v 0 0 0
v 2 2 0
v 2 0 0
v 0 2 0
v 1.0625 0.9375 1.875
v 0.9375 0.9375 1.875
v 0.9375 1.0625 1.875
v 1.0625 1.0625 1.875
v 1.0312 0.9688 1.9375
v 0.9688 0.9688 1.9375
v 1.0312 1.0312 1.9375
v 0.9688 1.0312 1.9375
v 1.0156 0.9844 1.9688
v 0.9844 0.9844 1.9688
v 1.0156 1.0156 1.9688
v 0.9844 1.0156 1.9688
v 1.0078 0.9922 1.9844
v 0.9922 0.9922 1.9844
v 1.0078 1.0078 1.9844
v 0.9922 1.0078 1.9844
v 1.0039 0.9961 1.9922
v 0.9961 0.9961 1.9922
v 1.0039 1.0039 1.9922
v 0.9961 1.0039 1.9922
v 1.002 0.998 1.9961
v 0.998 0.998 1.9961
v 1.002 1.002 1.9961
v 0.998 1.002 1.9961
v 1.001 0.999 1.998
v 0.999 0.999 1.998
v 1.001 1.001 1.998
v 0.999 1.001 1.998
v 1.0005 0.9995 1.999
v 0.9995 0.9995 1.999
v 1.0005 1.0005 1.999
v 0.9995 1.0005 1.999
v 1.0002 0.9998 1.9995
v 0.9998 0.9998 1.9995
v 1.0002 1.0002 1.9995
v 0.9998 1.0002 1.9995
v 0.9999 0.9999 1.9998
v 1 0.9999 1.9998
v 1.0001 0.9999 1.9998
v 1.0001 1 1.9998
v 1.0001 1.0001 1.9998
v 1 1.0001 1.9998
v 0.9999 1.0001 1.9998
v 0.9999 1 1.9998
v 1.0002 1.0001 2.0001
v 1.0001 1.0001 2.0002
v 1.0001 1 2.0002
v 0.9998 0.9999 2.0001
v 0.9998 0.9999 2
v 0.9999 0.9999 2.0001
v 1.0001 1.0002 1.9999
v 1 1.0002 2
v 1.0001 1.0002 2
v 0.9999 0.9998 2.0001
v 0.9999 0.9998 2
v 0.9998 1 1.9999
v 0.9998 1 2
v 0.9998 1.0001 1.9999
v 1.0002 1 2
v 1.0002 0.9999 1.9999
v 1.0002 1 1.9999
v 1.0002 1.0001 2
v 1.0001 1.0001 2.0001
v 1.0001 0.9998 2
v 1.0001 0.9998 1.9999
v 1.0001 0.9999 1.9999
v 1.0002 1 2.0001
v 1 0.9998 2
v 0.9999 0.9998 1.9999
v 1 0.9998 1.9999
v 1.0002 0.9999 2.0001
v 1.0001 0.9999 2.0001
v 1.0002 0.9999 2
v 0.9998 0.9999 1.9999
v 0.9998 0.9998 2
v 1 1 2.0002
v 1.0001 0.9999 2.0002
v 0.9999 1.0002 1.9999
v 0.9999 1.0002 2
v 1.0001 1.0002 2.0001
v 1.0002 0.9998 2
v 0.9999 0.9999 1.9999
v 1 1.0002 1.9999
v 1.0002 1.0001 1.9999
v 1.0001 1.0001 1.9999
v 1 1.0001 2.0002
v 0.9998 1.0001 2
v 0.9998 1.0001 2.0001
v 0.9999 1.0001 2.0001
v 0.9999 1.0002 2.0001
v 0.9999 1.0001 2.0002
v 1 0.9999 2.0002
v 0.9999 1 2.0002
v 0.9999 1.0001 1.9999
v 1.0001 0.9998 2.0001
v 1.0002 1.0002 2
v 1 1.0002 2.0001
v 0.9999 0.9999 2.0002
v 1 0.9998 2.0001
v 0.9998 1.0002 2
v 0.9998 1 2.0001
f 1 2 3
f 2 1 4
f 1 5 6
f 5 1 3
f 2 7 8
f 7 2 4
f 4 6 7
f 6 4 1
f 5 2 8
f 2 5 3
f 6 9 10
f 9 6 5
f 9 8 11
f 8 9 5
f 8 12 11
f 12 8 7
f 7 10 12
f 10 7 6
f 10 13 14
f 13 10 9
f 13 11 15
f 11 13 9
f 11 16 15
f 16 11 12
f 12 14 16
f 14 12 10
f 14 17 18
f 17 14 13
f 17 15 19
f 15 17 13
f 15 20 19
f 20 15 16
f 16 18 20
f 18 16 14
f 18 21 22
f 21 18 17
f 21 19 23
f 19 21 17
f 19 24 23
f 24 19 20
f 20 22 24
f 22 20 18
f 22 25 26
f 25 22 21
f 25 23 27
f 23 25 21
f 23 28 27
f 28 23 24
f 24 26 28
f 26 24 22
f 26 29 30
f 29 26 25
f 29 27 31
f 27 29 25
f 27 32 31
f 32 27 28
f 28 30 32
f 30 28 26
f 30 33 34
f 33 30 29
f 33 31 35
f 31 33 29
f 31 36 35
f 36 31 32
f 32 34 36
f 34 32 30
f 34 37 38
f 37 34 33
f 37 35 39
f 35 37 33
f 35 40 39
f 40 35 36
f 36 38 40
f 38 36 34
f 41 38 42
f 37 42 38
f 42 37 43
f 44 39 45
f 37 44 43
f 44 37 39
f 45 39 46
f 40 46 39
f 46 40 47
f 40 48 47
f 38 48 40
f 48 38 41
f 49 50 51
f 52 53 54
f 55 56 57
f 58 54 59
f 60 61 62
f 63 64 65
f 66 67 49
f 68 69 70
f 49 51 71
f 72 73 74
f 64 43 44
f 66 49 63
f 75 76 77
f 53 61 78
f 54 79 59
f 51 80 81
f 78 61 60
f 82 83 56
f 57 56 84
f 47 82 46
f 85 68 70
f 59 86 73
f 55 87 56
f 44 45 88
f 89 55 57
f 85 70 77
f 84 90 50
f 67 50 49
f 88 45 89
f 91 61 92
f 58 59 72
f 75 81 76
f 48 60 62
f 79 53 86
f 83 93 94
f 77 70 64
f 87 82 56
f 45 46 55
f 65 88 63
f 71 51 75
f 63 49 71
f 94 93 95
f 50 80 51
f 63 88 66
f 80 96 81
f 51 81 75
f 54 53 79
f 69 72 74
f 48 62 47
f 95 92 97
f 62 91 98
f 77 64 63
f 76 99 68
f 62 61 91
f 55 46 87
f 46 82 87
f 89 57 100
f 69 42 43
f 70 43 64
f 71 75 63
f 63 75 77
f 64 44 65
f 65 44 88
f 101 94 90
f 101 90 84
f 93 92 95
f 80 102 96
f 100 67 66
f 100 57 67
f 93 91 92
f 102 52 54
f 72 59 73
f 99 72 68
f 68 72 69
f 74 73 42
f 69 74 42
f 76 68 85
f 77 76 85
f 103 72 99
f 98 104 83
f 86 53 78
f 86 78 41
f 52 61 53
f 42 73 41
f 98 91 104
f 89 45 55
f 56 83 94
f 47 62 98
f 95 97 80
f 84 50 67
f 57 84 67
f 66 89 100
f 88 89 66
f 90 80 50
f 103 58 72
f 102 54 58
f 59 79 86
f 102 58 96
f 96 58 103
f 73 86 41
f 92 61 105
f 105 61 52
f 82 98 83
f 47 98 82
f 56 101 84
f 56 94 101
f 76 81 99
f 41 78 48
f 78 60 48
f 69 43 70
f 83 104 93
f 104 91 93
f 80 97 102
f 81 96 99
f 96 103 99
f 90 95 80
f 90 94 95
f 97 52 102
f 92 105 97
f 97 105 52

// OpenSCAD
// Unit of length: Unit.MM
union()
{
   polyhedron(points = [[0.0, 0.0, 0.0], [2.0, 0.0, 0.0], [2.0, 2.0, 0.0], [0.0, 2.0, 0.0], [0.5, 0.5, 1.0], [1.5, 0.5, 1.0], [1.5, 1.5, 1.0], [0.5, 1.5, 1.0], [0.75, 0.75, 1.5], [1.25, 0.75, 1.5], [1.25, 1.25, 1.5], [0.75, 1.25, 1.5], [0.875, 0.875, 1.75], [1.125, 0.875, 1.75], [1.125, 1.125, 1.75], [0.875, 1.125, 1.75], [0.9375, 0.9375, 1.875], [1.0625, 0.9375, 1.875], [1.0625, 1.0625, 1.875], [0.9375, 1.0625, 1.875], [0.9688, 0.9688, 1.9375], [1.0312, 0.9688, 1.9375], [1.0312, 1.0312, 1.9375], [0.9688, 1.0312, 1.9375], [0.9844, 0.9844, 1.9688], [1.0156, 0.9844, 1.9688], [1.0156, 1.0156, 1.9688], [0.9844, 1.0156, 1.9688], [0.9922, 0.9922, 1.9844], [1.0078, 0.9922, 1.9844], [1.0078, 1.0078, 1.9844], [0.9922, 1.0078, 1.9844], [0.9961, 0.9961, 1.9922], [1.0039, 0.9961, 1.9922], [1.0039, 1.0039, 1.9922], [0.9961, 1.0039, 1.9922], [0.998, 0.998, 1.9961], [1.002, 0.998, 1.9961], [1.002, 1.002, 1.9961], [0.998, 1.002, 1.9961], [0.999, 0.999, 1.998], [1.001, 0.999, 1.998], [1.001, 1.001, 1.998], [0.999, 1.001, 1.998], [0.9995, 0.9995, 1.999], [1.0005, 0.9995, 1.999], [1.0005, 1.0005, 1.999], [0.9995, 1.0005, 1.999], [0.9998, 0.9998, 1.9995], [1.0002, 0.9998, 1.9995], [1.0002, 1.0002, 1.9995], [0.9998, 1.0002, 1.9995], [0.9999, 0.9999, 1.9998], [1.0001, 0.9999, 1.9998], [1.0001, 1.0001, 1.9998], [0.9999, 1.0001, 1.9998], [0.9999, 0.9999, 1.9999], [1.0001, 0.9999, 1.9999], [1.0001, 1.0001, 1.9999], [0.9999, 1.0001, 1.9999], [1.0, 1.0, 1.9999]], faces = [[0, 1, 2, 3], [0, 4, 5, 1], [1, 5, 6, 2], [2, 6, 7, 3], [3, 7, 4, 0], [4, 8, 9, 5], [5, 9, 10, 6], [6, 10, 11, 7], [7, 11, 8, 4], [8, 12, 13, 9], [9, 13, 14, 10], [10, 14, 15, 11], [11, 15, 12, 8], [12, 16, 17, 13], [13, 17, 18, 14], [14, 18, 19, 15], [15, 19, 16, 12], [16, 20, 21, 17], [17, 21, 22, 18], [18, 22, 23, 19], [19, 23, 20, 16], [20, 24, 25, 21], [21, 25, 26, 22], [22, 26, 27, 23], [23, 27, 24, 20], [24, 28, 29, 25], [25, 29, 30, 26], [26, 30, 31, 27], [27, 31, 28, 24], [28, 32, 33, 29], [29, 33, 34, 30], [30, 34, 35, 31], [31, 35, 32, 28], [32, 36, 37, 33], [33, 37, 38, 34], [34, 38, 39, 35], [35, 39, 36, 32], [36, 40, 41, 37], [37, 41, 42, 38], [38, 42, 43, 39], [39, 43, 40, 36], [40, 44, 45, 41], [41, 45, 46, 42], [42, 46, 47, 43], [43, 47, 44, 40], [44, 48, 49, 45], [45, 49, 50, 46], [46, 50, 51, 47], [47, 51, 48, 44], [48, 52, 53, 49], [49, 53, 54, 50], [50, 54, 55, 51], [51, 55, 52, 48], [52, 56, 57, 53], [53, 57, 58, 54], [54, 58, 59, 55], [55, 59, 56, 52], [56, 60, 60, 57], [57, 60, 60, 58], [58, 60, 60, 59], [59, 60, 60, 56]]);
   color(c = [1.0, 0.753, 0.796, 1.0])
   {
      translate(v = [1.0, 1.0, 2.0])
      {
         sphere(d = 0.0005, $fn = 16);
      }
   }
   color(c = [1.0, 0.753, 0.796, 1.0])
   {
      translate(v = [1.0, 1.0, 2.0])
      {
         sphere(d = 0.0005, $fn = 16);
      }
   }
   color(c = [1.0, 0.753, 0.796, 1.0])
   {
      translate(v = [1.0, 1.0, 2.0])
      {
         sphere(d = 0.0005, $fn = 16);
      }
   }
}
